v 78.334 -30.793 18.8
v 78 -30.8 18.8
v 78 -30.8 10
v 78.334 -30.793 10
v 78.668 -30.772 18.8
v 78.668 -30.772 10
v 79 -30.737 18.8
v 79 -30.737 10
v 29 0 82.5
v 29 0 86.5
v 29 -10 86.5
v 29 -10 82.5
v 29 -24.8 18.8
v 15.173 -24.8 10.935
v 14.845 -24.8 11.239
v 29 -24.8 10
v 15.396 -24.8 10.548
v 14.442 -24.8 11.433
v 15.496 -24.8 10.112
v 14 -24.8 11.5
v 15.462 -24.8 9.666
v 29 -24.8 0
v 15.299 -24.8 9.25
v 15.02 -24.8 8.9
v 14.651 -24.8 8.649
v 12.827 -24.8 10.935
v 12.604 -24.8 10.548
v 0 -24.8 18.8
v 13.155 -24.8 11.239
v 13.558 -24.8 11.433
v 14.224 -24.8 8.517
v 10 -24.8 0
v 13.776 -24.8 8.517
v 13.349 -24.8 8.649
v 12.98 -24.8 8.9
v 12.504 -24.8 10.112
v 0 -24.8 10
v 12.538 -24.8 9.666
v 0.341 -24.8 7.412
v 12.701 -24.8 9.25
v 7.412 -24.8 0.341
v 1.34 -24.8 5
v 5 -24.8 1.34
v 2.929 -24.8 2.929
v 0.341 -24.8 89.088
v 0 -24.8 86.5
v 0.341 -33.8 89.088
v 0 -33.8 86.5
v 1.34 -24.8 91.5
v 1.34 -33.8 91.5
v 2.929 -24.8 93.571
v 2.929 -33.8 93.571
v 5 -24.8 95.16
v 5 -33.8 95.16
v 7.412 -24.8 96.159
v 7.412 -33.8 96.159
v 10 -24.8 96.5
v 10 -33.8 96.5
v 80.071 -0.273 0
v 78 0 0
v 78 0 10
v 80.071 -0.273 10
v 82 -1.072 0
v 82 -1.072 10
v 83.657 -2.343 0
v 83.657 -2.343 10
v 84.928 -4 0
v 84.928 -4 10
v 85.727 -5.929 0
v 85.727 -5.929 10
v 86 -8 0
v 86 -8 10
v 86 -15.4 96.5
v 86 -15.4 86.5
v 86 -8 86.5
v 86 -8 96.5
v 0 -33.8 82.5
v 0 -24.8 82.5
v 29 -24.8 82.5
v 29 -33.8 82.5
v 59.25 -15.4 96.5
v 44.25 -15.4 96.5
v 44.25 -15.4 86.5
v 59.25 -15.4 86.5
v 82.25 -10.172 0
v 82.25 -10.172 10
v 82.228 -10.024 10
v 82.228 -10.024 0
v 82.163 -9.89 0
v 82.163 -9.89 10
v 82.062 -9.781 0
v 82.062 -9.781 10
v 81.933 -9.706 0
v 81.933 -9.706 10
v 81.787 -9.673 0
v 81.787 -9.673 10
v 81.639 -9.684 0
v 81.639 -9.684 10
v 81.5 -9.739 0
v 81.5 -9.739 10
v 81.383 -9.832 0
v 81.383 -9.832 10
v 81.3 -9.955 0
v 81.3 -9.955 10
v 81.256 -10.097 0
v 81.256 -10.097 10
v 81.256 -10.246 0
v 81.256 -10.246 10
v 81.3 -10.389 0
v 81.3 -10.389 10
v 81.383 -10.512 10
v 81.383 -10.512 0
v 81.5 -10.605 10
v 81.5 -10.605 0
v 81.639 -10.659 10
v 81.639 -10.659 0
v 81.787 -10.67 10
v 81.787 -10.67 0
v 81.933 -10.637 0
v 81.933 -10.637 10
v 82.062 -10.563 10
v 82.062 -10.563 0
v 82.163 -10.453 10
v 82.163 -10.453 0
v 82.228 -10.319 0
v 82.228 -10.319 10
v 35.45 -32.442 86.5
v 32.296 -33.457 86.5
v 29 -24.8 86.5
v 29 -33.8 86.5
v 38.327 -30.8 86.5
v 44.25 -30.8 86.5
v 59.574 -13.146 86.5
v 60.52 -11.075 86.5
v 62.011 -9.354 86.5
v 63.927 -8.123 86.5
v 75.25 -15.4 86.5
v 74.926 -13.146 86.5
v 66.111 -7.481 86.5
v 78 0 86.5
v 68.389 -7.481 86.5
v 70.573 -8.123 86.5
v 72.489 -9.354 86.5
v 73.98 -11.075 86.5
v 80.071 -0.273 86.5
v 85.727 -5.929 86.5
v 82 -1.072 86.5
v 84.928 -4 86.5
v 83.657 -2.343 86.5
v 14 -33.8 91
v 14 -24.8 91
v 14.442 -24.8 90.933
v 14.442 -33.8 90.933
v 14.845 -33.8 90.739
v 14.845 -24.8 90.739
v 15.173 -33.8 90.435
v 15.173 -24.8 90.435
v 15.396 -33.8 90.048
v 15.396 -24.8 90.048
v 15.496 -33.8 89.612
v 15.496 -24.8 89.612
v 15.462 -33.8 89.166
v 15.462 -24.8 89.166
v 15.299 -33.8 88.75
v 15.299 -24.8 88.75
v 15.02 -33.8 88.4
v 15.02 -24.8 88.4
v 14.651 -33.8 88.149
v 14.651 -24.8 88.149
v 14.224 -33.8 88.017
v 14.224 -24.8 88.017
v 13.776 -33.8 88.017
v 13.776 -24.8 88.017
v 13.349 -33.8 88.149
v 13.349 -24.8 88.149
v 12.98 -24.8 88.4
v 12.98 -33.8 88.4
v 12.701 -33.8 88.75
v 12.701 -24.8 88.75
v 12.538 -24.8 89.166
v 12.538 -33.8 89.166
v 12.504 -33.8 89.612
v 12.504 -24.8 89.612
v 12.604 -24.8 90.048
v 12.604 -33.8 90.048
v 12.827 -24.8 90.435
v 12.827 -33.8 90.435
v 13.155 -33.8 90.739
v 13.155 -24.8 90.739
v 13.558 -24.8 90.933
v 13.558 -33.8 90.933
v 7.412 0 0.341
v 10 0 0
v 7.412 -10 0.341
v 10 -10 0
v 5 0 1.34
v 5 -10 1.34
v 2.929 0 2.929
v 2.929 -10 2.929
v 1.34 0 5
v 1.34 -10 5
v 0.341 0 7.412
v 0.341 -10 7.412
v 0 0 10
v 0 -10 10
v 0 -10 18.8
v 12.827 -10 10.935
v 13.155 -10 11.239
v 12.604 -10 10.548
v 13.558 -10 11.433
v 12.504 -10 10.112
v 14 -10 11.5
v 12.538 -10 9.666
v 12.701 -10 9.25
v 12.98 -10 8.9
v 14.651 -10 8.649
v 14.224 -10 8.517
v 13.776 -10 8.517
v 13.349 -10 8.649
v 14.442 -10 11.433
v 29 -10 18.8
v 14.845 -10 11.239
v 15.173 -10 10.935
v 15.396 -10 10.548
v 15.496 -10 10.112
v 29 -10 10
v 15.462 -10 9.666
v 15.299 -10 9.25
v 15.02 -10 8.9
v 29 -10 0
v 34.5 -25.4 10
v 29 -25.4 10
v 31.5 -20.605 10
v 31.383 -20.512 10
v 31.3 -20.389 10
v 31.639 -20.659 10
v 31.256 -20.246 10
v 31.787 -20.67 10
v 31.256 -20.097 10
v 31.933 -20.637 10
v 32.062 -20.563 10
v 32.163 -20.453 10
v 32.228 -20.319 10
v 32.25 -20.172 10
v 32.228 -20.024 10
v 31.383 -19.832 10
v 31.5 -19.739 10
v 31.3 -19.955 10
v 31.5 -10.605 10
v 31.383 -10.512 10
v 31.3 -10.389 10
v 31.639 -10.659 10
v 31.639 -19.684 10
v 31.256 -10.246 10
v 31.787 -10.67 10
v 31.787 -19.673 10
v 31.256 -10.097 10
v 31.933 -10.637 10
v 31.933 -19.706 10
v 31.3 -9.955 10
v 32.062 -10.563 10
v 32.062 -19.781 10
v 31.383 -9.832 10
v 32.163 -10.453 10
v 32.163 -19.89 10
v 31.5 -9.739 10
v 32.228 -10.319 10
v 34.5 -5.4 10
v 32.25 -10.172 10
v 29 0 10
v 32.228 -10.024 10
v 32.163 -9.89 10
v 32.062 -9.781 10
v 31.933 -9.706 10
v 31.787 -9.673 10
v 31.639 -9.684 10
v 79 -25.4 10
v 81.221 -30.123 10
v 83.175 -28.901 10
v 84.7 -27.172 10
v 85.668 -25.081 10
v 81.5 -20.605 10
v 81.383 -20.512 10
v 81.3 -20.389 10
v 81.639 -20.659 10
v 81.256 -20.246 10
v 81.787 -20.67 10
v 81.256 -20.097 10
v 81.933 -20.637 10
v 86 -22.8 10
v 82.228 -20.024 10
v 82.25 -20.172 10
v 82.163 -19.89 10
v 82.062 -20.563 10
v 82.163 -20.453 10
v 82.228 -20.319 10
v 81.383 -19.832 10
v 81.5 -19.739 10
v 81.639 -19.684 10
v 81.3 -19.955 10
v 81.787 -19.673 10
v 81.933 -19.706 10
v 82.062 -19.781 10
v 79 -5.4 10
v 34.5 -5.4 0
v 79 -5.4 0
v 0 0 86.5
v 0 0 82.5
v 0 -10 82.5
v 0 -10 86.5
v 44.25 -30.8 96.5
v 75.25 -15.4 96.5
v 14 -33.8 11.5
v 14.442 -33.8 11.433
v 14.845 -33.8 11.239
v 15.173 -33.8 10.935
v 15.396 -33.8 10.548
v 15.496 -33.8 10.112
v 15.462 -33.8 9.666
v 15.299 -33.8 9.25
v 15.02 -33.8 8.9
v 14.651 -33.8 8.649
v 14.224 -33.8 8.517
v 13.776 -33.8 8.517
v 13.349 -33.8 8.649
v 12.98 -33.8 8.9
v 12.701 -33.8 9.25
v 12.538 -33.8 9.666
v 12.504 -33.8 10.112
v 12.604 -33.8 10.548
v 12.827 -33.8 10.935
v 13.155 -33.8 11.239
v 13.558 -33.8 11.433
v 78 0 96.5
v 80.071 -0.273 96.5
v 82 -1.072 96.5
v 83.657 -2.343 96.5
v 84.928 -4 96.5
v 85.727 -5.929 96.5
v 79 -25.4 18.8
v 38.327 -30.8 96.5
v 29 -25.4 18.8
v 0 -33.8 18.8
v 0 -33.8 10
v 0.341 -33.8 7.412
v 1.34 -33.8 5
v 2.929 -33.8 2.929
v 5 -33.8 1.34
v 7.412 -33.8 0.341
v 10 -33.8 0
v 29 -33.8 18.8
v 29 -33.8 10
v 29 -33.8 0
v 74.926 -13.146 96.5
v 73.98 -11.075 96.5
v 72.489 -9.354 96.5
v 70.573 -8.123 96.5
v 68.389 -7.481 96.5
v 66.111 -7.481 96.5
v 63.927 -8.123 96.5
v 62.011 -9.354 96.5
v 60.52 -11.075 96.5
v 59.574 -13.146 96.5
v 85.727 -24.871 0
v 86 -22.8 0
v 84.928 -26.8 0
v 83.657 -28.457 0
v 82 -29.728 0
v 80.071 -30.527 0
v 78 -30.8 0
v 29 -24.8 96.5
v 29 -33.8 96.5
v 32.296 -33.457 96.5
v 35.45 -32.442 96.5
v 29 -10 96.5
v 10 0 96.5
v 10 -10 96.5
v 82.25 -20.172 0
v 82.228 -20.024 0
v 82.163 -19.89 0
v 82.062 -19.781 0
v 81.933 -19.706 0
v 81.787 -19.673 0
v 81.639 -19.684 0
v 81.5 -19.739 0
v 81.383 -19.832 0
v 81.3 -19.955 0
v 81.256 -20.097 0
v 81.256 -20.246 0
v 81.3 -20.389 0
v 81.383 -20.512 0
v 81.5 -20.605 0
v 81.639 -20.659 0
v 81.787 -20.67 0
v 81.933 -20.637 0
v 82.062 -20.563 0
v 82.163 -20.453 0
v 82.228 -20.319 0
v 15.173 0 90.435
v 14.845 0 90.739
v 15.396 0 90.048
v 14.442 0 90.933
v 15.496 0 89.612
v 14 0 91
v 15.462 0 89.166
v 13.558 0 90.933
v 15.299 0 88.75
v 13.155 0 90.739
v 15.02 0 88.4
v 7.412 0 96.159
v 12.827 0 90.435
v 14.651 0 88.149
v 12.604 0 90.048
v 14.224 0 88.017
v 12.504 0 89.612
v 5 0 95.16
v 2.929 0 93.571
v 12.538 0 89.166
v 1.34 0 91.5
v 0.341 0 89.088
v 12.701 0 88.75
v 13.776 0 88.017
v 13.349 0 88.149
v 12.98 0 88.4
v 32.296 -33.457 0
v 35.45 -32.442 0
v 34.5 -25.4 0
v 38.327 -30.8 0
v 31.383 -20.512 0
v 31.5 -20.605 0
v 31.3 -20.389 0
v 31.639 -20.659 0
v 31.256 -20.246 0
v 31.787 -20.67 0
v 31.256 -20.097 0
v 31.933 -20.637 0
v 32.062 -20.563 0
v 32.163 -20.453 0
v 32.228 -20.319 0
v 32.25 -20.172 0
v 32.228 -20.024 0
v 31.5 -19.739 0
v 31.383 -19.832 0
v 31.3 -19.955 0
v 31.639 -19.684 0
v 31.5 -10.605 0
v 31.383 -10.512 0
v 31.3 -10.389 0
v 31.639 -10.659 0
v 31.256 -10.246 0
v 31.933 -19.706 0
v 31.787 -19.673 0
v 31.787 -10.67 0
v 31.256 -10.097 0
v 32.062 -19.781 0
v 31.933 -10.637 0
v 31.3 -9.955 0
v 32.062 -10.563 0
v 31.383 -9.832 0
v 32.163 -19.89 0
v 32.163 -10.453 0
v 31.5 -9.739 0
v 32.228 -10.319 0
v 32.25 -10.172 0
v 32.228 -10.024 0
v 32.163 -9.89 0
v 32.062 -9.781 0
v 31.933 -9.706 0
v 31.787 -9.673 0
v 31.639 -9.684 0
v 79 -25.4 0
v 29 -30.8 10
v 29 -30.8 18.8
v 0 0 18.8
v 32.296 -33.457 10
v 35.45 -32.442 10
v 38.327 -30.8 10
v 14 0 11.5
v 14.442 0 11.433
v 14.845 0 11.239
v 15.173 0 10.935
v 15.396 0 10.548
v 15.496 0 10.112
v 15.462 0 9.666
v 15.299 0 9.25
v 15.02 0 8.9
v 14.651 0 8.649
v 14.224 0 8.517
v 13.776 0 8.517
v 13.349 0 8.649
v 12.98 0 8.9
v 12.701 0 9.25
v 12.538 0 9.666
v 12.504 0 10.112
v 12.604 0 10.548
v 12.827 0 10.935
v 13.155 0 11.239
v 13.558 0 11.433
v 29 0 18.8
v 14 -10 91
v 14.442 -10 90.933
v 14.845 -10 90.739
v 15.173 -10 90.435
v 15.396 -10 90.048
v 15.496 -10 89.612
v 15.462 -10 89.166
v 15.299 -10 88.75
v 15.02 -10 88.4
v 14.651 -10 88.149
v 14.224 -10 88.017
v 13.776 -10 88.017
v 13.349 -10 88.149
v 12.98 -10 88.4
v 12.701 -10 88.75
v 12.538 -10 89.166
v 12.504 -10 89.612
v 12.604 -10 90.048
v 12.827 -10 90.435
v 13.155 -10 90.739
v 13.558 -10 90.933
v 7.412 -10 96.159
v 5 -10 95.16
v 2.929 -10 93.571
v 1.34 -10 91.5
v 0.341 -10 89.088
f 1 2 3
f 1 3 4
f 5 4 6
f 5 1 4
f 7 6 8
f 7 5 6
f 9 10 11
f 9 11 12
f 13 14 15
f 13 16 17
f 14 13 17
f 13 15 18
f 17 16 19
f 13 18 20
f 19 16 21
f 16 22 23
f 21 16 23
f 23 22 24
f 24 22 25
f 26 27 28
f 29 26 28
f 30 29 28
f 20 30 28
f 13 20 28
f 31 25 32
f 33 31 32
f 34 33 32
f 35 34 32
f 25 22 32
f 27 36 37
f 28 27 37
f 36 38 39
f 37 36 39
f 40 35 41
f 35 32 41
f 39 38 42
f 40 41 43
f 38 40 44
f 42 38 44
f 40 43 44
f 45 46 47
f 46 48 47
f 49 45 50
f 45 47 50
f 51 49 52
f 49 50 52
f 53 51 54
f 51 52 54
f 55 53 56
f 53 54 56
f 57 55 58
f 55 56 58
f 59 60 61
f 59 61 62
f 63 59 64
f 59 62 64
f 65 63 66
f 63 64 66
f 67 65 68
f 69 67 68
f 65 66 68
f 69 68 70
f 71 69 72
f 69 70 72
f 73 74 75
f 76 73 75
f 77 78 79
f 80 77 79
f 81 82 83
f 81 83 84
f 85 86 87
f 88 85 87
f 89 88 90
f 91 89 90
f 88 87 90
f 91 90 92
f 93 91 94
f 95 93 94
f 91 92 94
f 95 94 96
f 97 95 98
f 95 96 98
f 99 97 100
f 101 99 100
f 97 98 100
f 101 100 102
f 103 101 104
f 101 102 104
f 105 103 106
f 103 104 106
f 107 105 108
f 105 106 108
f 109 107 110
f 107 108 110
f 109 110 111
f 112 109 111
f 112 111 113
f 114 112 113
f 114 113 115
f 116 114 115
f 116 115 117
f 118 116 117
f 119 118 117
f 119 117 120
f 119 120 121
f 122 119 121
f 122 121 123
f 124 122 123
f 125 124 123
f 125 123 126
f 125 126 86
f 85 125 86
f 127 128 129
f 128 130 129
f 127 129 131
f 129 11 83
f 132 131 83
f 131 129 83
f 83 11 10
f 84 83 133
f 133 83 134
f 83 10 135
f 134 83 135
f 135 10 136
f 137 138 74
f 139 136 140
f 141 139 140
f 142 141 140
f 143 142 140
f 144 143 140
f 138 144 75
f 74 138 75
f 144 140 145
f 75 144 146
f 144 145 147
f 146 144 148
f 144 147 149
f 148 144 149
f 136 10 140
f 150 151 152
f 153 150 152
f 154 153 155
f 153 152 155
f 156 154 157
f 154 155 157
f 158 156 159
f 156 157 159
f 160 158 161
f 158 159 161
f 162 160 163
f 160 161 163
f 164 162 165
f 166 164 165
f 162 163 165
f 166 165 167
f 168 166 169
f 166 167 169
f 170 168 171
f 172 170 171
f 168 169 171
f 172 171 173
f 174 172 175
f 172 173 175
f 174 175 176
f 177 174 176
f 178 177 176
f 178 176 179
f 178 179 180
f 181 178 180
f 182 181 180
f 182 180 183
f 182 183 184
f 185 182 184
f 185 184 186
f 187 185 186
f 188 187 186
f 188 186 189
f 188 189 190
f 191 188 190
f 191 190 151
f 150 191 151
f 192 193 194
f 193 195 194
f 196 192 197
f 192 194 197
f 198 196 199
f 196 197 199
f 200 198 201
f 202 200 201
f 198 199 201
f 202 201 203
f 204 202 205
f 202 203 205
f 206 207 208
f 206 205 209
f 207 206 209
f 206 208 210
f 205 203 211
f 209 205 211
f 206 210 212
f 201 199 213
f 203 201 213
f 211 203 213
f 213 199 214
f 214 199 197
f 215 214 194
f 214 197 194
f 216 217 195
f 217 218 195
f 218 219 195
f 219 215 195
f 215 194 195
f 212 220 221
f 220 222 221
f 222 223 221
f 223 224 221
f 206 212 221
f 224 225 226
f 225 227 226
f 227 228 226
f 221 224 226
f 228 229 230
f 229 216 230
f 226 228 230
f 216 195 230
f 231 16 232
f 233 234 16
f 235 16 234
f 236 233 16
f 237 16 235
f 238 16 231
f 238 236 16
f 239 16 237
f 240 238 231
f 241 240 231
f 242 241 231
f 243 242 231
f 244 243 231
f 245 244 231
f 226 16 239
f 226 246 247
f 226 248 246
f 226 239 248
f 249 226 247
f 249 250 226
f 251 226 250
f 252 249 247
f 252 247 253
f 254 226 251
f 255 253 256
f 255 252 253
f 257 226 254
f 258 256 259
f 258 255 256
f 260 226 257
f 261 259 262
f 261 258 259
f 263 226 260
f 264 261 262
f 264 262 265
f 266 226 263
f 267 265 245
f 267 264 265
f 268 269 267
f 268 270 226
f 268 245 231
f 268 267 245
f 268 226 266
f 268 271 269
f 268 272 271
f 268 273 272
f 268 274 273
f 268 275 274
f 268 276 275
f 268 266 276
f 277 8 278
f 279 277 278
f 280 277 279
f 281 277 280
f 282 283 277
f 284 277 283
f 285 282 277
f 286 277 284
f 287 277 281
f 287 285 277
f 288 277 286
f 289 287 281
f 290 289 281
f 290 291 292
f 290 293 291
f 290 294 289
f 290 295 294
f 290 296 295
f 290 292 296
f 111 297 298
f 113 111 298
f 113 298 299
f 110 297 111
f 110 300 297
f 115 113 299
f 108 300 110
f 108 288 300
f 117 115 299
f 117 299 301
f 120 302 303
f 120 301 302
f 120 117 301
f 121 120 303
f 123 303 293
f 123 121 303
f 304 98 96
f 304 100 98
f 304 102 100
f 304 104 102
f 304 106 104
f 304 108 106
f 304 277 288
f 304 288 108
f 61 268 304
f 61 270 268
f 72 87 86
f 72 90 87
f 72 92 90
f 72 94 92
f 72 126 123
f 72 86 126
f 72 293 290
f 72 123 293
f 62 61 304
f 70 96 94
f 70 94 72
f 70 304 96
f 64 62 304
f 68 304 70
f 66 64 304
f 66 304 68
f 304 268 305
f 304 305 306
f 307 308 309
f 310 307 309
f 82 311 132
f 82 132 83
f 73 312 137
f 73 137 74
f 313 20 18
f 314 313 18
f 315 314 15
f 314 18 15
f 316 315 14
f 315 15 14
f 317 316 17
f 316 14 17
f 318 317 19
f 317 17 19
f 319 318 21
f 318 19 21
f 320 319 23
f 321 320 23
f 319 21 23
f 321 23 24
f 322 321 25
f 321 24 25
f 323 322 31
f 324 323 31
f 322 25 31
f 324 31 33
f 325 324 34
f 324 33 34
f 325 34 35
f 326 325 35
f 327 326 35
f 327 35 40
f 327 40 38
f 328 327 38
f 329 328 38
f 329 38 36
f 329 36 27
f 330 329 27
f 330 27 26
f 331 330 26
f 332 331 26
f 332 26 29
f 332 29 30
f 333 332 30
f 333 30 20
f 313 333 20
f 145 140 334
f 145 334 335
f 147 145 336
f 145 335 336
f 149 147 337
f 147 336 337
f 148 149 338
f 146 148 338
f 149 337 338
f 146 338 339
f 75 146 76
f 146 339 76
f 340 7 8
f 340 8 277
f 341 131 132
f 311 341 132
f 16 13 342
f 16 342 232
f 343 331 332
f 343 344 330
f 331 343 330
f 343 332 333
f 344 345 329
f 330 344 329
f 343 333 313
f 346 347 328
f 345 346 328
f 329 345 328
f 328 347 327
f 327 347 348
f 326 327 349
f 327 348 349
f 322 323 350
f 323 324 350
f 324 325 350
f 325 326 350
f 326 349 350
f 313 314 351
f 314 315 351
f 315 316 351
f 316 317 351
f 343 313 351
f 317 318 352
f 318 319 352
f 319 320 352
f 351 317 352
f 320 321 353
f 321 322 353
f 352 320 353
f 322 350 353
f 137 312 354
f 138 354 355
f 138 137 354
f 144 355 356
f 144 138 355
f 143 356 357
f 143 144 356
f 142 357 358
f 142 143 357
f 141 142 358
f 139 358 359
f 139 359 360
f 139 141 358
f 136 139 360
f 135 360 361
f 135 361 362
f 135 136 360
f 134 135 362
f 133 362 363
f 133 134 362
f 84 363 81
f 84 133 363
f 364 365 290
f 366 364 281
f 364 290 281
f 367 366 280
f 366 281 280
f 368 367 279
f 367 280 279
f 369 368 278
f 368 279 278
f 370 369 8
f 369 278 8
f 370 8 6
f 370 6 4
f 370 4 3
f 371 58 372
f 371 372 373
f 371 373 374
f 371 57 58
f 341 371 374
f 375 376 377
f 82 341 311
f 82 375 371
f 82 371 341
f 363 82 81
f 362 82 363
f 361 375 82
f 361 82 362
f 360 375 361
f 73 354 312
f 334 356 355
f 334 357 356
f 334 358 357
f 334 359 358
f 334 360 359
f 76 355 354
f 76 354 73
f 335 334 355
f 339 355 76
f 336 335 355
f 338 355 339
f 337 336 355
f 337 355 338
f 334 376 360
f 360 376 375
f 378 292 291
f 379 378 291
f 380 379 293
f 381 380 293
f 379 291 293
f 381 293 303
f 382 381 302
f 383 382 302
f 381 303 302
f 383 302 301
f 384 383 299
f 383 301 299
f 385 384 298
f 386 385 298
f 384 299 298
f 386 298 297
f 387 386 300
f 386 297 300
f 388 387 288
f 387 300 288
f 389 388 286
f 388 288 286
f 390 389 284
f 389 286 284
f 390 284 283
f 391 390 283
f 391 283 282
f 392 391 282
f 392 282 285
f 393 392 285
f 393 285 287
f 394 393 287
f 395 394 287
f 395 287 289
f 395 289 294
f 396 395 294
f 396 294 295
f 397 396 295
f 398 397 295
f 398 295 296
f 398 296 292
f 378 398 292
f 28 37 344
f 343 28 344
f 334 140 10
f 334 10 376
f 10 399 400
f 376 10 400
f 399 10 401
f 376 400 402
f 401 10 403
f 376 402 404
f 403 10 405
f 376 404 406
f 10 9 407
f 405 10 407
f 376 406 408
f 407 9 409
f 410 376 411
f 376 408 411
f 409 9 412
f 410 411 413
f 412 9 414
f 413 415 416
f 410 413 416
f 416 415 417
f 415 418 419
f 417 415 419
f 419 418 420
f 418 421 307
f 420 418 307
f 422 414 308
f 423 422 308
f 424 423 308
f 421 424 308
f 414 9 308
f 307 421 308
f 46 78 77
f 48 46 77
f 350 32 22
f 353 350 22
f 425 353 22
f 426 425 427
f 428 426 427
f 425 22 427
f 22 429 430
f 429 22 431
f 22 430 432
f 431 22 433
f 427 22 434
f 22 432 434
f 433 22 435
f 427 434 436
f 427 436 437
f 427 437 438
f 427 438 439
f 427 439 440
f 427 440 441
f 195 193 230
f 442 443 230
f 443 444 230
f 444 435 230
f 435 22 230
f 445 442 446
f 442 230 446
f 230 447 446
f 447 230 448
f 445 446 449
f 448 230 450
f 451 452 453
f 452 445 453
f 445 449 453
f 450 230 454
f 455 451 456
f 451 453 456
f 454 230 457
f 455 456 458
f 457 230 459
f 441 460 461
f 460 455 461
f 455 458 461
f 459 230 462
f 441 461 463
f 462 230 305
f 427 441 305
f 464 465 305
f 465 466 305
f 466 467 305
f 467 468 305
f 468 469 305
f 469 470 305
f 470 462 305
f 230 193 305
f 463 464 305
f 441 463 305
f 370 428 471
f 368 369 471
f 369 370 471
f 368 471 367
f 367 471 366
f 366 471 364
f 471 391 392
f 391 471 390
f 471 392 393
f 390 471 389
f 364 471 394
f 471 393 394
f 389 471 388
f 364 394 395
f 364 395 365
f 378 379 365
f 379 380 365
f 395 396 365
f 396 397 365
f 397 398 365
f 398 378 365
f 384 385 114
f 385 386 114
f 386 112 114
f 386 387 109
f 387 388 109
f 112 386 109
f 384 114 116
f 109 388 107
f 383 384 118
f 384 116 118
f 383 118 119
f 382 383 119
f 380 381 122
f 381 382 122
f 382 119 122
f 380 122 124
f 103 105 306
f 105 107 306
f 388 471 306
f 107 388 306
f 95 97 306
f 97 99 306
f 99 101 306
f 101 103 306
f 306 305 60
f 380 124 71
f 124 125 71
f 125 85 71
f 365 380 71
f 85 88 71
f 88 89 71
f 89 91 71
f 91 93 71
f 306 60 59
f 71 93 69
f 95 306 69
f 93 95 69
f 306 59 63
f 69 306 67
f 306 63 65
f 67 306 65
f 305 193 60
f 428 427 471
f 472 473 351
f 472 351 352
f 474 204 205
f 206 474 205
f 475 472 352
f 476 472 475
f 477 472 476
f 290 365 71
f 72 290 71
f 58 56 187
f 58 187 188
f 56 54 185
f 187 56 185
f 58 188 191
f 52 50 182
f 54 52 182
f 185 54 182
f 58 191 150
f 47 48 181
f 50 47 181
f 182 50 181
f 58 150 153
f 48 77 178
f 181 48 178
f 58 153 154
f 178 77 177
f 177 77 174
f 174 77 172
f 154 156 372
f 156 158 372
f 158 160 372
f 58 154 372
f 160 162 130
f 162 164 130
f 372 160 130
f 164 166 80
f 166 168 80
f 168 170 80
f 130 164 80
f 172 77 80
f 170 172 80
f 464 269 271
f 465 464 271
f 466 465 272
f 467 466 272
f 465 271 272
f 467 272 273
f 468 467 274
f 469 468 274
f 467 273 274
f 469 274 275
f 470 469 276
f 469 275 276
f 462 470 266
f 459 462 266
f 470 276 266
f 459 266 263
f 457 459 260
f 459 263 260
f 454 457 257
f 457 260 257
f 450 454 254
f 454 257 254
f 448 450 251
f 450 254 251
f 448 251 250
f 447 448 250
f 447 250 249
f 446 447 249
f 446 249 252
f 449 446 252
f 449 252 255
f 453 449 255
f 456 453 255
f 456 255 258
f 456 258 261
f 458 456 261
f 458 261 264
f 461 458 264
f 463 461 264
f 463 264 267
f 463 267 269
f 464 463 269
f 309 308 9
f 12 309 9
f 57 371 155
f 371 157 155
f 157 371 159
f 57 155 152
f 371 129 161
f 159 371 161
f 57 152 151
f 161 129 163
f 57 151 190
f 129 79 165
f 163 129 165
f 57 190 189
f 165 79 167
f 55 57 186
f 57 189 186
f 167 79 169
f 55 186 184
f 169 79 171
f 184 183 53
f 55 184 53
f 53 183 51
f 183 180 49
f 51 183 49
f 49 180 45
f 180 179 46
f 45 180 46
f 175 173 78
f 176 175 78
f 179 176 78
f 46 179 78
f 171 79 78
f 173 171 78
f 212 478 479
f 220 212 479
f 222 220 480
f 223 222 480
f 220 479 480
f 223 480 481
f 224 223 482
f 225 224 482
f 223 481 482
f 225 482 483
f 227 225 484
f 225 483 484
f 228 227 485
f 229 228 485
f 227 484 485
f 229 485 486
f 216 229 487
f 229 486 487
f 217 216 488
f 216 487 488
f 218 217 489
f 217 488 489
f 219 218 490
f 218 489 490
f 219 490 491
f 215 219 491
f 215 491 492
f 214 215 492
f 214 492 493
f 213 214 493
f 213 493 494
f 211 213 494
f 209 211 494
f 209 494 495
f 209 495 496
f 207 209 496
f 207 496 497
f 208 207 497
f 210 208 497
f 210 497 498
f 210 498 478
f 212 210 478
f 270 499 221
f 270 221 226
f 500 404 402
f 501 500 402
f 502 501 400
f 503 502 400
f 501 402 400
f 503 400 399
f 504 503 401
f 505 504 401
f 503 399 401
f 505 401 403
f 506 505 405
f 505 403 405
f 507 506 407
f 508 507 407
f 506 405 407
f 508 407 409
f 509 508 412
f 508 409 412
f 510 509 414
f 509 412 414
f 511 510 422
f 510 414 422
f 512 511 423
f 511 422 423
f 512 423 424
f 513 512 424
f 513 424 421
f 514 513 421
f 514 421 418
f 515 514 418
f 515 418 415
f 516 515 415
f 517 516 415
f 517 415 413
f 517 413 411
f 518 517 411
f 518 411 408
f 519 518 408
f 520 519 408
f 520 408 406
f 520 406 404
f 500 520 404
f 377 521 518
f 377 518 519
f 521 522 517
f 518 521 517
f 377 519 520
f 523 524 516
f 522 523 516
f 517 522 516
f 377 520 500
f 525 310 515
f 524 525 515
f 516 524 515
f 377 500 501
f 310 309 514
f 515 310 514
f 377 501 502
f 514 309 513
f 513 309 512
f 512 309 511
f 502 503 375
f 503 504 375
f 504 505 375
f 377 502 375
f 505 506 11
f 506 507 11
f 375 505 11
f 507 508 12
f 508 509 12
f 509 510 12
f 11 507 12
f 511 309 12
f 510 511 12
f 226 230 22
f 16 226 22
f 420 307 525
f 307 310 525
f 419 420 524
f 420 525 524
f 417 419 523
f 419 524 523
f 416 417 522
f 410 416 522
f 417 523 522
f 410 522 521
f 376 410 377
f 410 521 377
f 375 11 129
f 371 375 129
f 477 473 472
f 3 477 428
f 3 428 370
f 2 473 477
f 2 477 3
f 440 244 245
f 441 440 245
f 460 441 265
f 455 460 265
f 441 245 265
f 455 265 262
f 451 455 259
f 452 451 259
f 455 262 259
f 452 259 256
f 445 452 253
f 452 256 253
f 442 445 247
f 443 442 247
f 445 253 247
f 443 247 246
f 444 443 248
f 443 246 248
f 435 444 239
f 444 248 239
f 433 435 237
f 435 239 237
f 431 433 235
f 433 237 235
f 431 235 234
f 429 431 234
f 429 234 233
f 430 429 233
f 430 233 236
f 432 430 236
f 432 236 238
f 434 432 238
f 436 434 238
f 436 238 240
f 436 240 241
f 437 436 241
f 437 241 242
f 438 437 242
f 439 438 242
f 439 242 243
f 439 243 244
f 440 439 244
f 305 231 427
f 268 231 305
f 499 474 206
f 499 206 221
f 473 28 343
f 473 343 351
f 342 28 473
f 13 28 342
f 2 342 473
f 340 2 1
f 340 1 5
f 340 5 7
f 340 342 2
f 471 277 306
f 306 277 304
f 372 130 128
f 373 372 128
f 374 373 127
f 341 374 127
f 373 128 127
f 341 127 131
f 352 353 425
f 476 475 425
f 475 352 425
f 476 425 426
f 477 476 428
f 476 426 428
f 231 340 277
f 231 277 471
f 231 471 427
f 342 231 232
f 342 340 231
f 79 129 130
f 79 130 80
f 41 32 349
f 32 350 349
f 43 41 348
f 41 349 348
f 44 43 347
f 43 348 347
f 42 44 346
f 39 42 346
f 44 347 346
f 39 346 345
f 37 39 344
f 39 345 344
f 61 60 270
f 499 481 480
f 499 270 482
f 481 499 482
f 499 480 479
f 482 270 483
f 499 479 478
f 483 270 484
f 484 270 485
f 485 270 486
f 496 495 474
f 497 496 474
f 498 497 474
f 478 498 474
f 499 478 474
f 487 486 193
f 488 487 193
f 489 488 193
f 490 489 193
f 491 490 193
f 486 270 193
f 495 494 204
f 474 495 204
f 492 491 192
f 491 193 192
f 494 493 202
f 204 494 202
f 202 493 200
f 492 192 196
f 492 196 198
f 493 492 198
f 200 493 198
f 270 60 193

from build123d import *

# Parameters (mm, degrees)
SKETCH1_R           = 8
BOSS_EXTRUDE1_DEPTH = 96.5
SKETCH2_W           = 57
SKETCH2_H           = 76.5
CUT_EXTRUDE1_DEPTH  = 102
FILLET1_R           = 8
SKETCH3_R           = 1.5
CUT_EXTRUDE2_DEPTH  = 134.606474394
CUT_EXTRUDE3_REACH  = 128.573
SKETCH4_R           = 0.5
SKETCH4_W           = 44.5
SKETCH4_H           = 20
BOSS_EXTRUDE2_START = 8.8
BOSS_EXTRUDE2_DEPTH = 8.8
CUT_EXTRUDE4_DEPTH  = 10
FILLET3_R           = 10
SKETCH7_W           = 29
SKETCH7_H           = 63.7
CUT_EXTRUDE5_DEPTH  = 134.606474394


with BuildPart() as part:
    # Sketch1 → Boss-Extrude1 (new body)
    with BuildSketch(Plane.XY):
        with BuildLine():
            Line((86, 0), (0, 0))
            Line((0, 0), (0, -10))
            Line((0, -10), (29, -10))
            Line((29, -10), (29, -24.8))
            Line((29, -24.8), (0, -24.8))
            Line((0, -24.8), (0, -33.8))
            Line((0, -33.8), (29, -33.8))
            ThreePointArc((29, -33.8), (33.898979486, -33.031546212), (38.327379053, -30.8))
            Line((38.327379053, -30.8), (86, -30.8))
            Line((86, -30.8), (86, 0))
        make_face()
        with Locations((67.25, -15.4)):
            Circle(SKETCH1_R, mode=Mode.SUBTRACT)
    extrude(amount=BOSS_EXTRUDE1_DEPTH)

    # Sketch2 → Cut-Extrude1 (cut)
    with BuildSketch(Plane(origin=(0, 0, 0), x_dir=(1, 0, 0), z_dir=(0, 1, 0))):
        with Locations((57.5, -48.25)):
            Rectangle(SKETCH2_W, SKETCH2_H)
    extrude(amount=-CUT_EXTRUDE1_DEPTH, mode=Mode.SUBTRACT)

    # Fillet1
    fillet1_edges = [part.edges().sort_by_distance(p)[0] for p in [
        (86, -30.8, 91.5),
        (86, 0, 91.5),
        (86, -30.8, 5),
        (86, 0, 5),
    ]]
    fillet(fillet1_edges, radius=FILLET1_R)

    # Sketch3 → Cut-Extrude2 (cut, through all)
    with BuildSketch(Plane(origin=(0, 0, 0), x_dir=(1, 0, 0), z_dir=(0, 1, 0))):
        with Locations(Location((14, -10, 0), (0, 0, 270))):
            Circle(SKETCH3_R)
        with Locations(Location((14, -89.5, 0), (0, 0, 270))):
            Circle(SKETCH3_R)
    extrude(amount=-CUT_EXTRUDE2_DEPTH, mode=Mode.SUBTRACT)

    # Sketch4 → Cut-Extrude3 (cut, up to next)
    with BuildSketch(Plane.XY.offset(10), mode=Mode.PRIVATE) as cut_extrude3_sk1:
        with Locations((81.75, -20.171836185)):
            Circle(SKETCH4_R)
    cut_extrude3_tool1 = extrude(cut_extrude3_sk1.sketch, amount=-CUT_EXTRUDE3_REACH, mode=Mode.PRIVATE) & part.part
    # Sketch4 → Cut-Extrude3 (cut, up to next)
    with BuildSketch(Plane.XY.offset(10), mode=Mode.PRIVATE) as cut_extrude3_sk2:
        with Locations((81.75, -10.171836185)):
            Circle(SKETCH4_R)
    cut_extrude3_tool2 = extrude(cut_extrude3_sk2.sketch, amount=-CUT_EXTRUDE3_REACH, mode=Mode.PRIVATE) & part.part
    # Sketch4 → Cut-Extrude3 (cut, up to next)
    with BuildSketch(Plane.XY.offset(10), mode=Mode.PRIVATE) as cut_extrude3_sk3:
        with Locations((31.75, -20.171836185)):
            Circle(SKETCH4_R)
    cut_extrude3_tool3 = extrude(cut_extrude3_sk3.sketch, amount=-CUT_EXTRUDE3_REACH, mode=Mode.PRIVATE) & part.part
    # Sketch4 → Cut-Extrude3 (cut, up to next)
    with BuildSketch(Plane.XY.offset(10), mode=Mode.PRIVATE) as cut_extrude3_sk4:
        with Locations((31.75, -10.171836185)):
            Circle(SKETCH4_R)
    cut_extrude3_tool4 = extrude(cut_extrude3_sk4.sketch, amount=-CUT_EXTRUDE3_REACH, mode=Mode.PRIVATE) & part.part
    # Sketch4 → Cut-Extrude3 (cut, up to next)
    with BuildSketch(Plane.XY.offset(10), mode=Mode.PRIVATE) as cut_extrude3_sk5:
        with Locations((56.75, -15.4)):
            Rectangle(SKETCH4_W, SKETCH4_H)
    cut_extrude3_tool5 = extrude(cut_extrude3_sk5.sketch, amount=-CUT_EXTRUDE3_REACH, mode=Mode.PRIVATE) & part.part
    add(cut_extrude3_tool1.solids().sort_by_distance((81.75, -20.171836, 10))[0], mode=Mode.SUBTRACT)
    add(cut_extrude3_tool2.solids().sort_by_distance((81.75, -10.171836, 10))[0], mode=Mode.SUBTRACT)
    add(cut_extrude3_tool3.solids().sort_by_distance((31.75, -20.171836, 10))[0], mode=Mode.SUBTRACT)
    add(cut_extrude3_tool4.solids().sort_by_distance((31.75, -10.171836, 10))[0], mode=Mode.SUBTRACT)
    add(cut_extrude3_tool5.solids().sort_by_distance((56.75, -15.4, 10))[0], mode=Mode.SUBTRACT)

    # Sketch5 → Boss-Extrude2 (add)
    with BuildSketch(Plane.XY.offset(10).offset(BOSS_EXTRUDE2_START)):
        with BuildLine():
            Line((79, -30.737253933), (79, -25.4))
            Line((79, -25.4), (34.5, -25.4))
            Line((34.5, -25.4), (29, -25.4))
            Line((29, -25.4), (29, -30.8))
            Line((29, -30.8), (38.327379053, -30.8))
            Line((38.327379053, -30.8), (42.496230888, -30.8))
            Line((42.496230888, -30.8), (78, -30.8))
            ThreePointArc((78, -30.8), (78.5009833, -30.784298074), (79, -30.737253933))
        make_face()
    extrude(amount=-BOSS_EXTRUDE2_DEPTH)

    # Sketch6 → Cut-Extrude4 (cut)
    with BuildSketch(Plane.XY.offset(96.5)):
        with BuildLine():
            Line((75.25, -15.4), (86, -15.4))
            Line((86, -15.4), (86, -22.8))
            ThreePointArc((86, -22.8), (83.656854249, -28.456854249), (78, -30.8))
            Line((78, -30.8), (44.25, -30.8))
            Line((44.25, -30.8), (44.25, -15.4))
            Line((44.25, -15.4), (59.25, -15.4))
            ThreePointArc((59.25, -15.4), (67.25, -23.4), (75.25, -15.4))
        make_face()
    extrude(amount=-CUT_EXTRUDE4_DEPTH, mode=Mode.SUBTRACT)

    # Fillet3
    fillet3_edges = [part.edges().sort_by_distance(p)[0] for p in [
        (0, -29.3, 96.5),
        (0, -5, 96.5),
        (0, -5, 0),
        (0, -29.3, 0),
    ]]
    fillet(fillet3_edges, radius=FILLET3_R)

    # Sketch7 → Cut-Extrude5 (cut, through all)
    with BuildSketch(Plane(origin=(0, 0, 0), x_dir=(1, 0, 0), z_dir=(0, 1, 0))):
        with Locations((14.5, -50.65)):
            Rectangle(SKETCH7_W, SKETCH7_H)
    extrude(amount=-CUT_EXTRUDE5_DEPTH, mode=Mode.SUBTRACT)


with BuildPart() as cut_extrude5_piece_1:
    # of the separate pieces the step leaves, piece 1, a body of its own (cut_extrude5_pieces)
    add(part.part.solids().sort_by_distance((10, 0, 0))[0])


with BuildPart() as cut_extrude5_piece_2:
    # of the separate pieces the step leaves, piece 2, a body of its own (cut_extrude5_pieces)
    add(part.part.solids().sort_by_distance((0, 0, 82.5))[0])


solid = Compound([cut_extrude5_piece_1.part, cut_extrude5_piece_2.part])
